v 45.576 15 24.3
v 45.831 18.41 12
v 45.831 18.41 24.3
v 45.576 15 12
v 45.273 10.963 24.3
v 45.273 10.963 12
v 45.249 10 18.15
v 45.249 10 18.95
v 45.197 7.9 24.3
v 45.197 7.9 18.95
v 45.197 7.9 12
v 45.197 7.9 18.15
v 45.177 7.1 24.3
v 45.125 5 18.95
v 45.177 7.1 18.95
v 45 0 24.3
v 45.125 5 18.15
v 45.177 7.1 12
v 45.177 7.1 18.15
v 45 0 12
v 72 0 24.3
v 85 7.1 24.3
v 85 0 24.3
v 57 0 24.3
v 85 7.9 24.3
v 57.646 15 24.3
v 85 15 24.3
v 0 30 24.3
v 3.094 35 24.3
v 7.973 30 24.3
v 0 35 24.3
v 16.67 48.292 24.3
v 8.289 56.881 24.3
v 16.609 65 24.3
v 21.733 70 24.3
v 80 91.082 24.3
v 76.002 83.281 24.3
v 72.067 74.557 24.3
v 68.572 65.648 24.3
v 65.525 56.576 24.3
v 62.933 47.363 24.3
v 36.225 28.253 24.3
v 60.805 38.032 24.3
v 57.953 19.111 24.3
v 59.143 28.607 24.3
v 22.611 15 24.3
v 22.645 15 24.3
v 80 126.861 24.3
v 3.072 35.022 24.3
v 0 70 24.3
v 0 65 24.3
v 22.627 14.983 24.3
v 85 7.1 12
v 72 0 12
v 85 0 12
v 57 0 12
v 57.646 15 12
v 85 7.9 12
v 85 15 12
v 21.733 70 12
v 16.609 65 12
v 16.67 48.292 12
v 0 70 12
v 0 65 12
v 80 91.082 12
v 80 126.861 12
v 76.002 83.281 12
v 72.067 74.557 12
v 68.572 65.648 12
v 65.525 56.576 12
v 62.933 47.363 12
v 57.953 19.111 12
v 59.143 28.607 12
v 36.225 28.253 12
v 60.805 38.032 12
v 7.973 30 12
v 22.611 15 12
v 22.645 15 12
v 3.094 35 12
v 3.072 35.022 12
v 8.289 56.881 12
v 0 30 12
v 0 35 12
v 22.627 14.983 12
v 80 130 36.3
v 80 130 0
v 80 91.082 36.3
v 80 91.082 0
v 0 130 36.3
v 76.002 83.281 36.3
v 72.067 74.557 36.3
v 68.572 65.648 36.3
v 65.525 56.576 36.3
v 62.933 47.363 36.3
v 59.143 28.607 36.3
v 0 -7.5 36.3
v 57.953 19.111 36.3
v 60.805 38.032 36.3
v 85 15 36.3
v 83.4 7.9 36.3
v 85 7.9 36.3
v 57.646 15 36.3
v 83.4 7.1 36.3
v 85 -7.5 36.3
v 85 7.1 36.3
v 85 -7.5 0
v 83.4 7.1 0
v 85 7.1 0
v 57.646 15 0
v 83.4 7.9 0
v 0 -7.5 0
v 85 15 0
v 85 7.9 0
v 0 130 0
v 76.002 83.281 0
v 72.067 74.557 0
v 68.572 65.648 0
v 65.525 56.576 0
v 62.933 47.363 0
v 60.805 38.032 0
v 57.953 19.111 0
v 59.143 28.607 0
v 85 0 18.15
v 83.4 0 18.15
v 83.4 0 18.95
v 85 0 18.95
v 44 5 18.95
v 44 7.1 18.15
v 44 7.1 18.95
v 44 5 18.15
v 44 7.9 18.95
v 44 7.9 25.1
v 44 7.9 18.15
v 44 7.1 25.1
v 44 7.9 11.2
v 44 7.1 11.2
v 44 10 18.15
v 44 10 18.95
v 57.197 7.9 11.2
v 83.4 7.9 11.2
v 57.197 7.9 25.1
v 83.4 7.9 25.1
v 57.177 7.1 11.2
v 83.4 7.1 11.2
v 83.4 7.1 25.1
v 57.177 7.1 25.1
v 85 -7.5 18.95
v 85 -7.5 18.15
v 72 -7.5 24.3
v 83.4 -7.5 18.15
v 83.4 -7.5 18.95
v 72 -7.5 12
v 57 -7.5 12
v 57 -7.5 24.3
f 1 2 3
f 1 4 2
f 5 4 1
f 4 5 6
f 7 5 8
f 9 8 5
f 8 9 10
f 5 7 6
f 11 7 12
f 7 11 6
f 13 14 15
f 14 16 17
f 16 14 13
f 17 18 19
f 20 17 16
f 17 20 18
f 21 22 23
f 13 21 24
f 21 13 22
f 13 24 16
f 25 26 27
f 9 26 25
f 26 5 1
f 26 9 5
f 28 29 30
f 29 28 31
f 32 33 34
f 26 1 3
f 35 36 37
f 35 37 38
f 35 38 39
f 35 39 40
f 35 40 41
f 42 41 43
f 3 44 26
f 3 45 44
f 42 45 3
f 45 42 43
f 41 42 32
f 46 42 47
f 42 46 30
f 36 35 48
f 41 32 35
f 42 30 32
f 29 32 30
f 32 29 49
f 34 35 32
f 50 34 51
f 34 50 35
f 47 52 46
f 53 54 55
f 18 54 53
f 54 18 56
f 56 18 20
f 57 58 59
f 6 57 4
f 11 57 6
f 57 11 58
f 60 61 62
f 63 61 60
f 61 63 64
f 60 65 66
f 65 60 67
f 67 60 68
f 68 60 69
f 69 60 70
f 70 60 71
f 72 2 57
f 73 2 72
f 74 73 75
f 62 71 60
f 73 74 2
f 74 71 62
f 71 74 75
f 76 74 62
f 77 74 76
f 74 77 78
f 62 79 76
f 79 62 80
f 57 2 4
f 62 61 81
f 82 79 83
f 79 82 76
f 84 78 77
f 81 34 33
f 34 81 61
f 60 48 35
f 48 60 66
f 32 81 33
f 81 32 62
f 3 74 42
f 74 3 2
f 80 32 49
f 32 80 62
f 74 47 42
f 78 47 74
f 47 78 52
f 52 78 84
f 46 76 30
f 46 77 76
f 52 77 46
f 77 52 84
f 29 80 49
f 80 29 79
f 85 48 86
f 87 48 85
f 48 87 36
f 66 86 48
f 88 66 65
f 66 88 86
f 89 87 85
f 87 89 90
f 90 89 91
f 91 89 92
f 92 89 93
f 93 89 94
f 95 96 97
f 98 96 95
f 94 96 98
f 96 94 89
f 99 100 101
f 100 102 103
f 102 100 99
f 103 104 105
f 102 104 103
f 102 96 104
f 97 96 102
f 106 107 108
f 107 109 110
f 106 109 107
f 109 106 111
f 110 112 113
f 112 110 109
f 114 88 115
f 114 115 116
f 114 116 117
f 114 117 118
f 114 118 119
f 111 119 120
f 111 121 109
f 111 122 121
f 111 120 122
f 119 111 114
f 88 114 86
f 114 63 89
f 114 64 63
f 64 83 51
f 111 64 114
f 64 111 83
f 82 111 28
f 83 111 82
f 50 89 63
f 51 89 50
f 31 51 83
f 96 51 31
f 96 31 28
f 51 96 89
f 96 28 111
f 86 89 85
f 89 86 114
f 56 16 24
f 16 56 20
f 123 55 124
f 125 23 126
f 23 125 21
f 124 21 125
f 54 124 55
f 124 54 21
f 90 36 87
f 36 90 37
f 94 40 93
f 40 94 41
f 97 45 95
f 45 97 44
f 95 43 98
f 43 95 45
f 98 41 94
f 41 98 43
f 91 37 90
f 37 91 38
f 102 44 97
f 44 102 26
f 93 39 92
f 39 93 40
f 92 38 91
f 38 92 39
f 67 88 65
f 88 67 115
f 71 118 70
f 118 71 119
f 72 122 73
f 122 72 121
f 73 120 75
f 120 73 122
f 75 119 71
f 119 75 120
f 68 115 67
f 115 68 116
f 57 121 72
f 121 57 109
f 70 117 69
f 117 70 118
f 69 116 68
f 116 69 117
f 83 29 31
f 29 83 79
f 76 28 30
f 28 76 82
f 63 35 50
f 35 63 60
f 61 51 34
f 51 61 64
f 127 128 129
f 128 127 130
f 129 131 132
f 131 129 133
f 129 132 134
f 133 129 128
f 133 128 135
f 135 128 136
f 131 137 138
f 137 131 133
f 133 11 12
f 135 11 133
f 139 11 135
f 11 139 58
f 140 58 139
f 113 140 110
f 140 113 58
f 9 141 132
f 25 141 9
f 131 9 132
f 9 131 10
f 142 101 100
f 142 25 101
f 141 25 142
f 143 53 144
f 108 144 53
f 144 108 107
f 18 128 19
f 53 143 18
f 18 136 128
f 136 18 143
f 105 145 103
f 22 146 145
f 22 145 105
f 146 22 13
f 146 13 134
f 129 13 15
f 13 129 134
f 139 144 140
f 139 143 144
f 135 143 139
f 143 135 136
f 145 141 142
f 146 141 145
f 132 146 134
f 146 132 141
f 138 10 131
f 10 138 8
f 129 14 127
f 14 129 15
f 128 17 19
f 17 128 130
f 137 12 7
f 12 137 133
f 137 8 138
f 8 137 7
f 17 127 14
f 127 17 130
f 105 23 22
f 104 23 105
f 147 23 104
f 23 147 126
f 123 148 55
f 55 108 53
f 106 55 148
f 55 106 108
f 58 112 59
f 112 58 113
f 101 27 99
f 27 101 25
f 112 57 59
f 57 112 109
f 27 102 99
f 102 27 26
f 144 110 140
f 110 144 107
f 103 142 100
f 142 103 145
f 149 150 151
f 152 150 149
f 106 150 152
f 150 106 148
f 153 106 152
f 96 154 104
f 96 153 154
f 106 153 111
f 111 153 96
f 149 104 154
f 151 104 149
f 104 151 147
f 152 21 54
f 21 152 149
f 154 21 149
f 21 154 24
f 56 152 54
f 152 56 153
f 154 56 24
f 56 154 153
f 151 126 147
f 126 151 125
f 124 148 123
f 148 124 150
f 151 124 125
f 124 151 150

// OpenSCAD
// Copyright 2024 Martin Scheidt (Attribution 4.0 International, CC-BY 4.0)
//
// You are free to copy and redistribute the material in any medium or format.
// You are free to remix, transform, and build upon the material for any purpose, even commercially.
// You must give appropriate credit, provide a link to the license, and indicate if changes were made.
// You may not apply legal terms or technological measures that legally restrict others from doing anything the license permits.
// No warranties are given.

include<config.scad>

module switch_shape(){
    translate([dtc_outer_radius+45,0,dtc_cutout_z_pos]) rotate([0,0,180-curve_angle])union(){
        rotate_extrude(angle = curve_angle) square([dtc_outer_radius, dtc_cutout_height]);
        translate([dtc_outer_radius-rail_width-15,0,0])cube([rail_width+15, straight_length, dsc_depth]);
        translate([dtc_outer_radius-(rail_width-12)-12,0,0]) cube([rail_width-12,straight_length+19,dsc_depth]);
    }
}

module drill_template_switch(){
difference(){
    cube([80,130,dtc_height]); //dtc_height
    switch_shape();
    
    // curved sides
    translate([24+dtc_outer_radius+dsg_thickness,0,dtc_cutout_z_pos+dtc_cutout_height])rotate([0,0,180-curve_angle])rotate_extrude(angle = curve_angle) square([dtc_middle_radius, dtc_cutout_z_pos]);
    translate([24+dtc_outer_radius+dsg_thickness,0,0])rotate([0,0,180-curve_angle])rotate_extrude(angle = curve_angle) square([dtc_middle_radius, dtc_cutout_z_pos]);
    
    // ground holes
    translate([0,30,dtc_cutout_z_pos])cube([60, dsg_hole_depth, dtc_cutout_height]);
    translate([0,65,dtc_cutout_z_pos])cube([60, dsg_hole_depth, dtc_cutout_height]);
    
    // hole position lines
    translate([44, dtch_y_pos-thin_line/2, dtc_cutout_z_pos]) cube([2*thin_line, thin_line, dtc_cutout_height]);
    translate([44, dtch_y_pos-thin_line/2,dtc_cutout_z_pos-thin_line])cube([dtc_cutout_z_pos+5, thin_line, thin_line]);
    translate([44, dtch_y_pos-thin_line/2,dtc_cutout_z_pos+dtc_cutout_height])cube([dtc_cutout_z_pos+5, thin_line, thin_line]);
    translate([44, dtch_y_pos-5/2, dtc_cutout_z_pos+dtch_z_pos]) cube([2*thin_line, 5, thin_line]);
    
}
//translate([0,-5,0]) cube([45+12, 5,dtc_height]);
difference(){
    union(){
        //stabilisation pillar
        cube([45+rail_width,15,dtc_cutout_z_pos]);
        translate([0,0,dtc_cutout_z_pos+dtc_cutout_height]) cube([45+rail_width,15,dtc_cutout_z_pos]);
    }
    translate([45+rail_width-2*thin_line, dtch_y_pos-thin_line/2, dtc_cutout_z_pos-dtc_cutout_height]) cube([2*thin_line, thin_line, dtc_cutout_height]);
    translate([45+rail_width-2*thin_line, dtch_y_pos-thin_line/2, dtc_cutout_z_pos+dtc_cutout_height]) cube([2*thin_line, thin_line, dtc_cutout_height]);
    translate([44, dtch_y_pos-thin_line/2,dtc_cutout_z_pos-thin_line])cube([dtc_cutout_z_pos+rail_width, thin_line, thin_line]);
    translate([44, dtch_y_pos-thin_line/2,dtc_cutout_z_pos+dtc_cutout_height])cube([dtc_cutout_z_pos+rail_width, thin_line, thin_line]);
}
// connector space
difference(){
    translate([0,-dsc_connector_width/2,0])cube([45+rail_width,dsc_connector_width/2,2*dtc_cutout_z_pos+dtc_cutout_height]);
    translate([45+12,-dsc_connector_width, dtc_cutout_z_pos]) cube([dsc_connector_height ,dsc_connector_width, dsc_depth]);
    translate([45+rail_width-2*thin_line, -dsc_connector_width, dtc_cutout_z_pos+dtch_z_pos]) cube([2*thin_line, dsc_connector_width, thin_line]);
}
}
//switch_shape();

drill_template_switch();
